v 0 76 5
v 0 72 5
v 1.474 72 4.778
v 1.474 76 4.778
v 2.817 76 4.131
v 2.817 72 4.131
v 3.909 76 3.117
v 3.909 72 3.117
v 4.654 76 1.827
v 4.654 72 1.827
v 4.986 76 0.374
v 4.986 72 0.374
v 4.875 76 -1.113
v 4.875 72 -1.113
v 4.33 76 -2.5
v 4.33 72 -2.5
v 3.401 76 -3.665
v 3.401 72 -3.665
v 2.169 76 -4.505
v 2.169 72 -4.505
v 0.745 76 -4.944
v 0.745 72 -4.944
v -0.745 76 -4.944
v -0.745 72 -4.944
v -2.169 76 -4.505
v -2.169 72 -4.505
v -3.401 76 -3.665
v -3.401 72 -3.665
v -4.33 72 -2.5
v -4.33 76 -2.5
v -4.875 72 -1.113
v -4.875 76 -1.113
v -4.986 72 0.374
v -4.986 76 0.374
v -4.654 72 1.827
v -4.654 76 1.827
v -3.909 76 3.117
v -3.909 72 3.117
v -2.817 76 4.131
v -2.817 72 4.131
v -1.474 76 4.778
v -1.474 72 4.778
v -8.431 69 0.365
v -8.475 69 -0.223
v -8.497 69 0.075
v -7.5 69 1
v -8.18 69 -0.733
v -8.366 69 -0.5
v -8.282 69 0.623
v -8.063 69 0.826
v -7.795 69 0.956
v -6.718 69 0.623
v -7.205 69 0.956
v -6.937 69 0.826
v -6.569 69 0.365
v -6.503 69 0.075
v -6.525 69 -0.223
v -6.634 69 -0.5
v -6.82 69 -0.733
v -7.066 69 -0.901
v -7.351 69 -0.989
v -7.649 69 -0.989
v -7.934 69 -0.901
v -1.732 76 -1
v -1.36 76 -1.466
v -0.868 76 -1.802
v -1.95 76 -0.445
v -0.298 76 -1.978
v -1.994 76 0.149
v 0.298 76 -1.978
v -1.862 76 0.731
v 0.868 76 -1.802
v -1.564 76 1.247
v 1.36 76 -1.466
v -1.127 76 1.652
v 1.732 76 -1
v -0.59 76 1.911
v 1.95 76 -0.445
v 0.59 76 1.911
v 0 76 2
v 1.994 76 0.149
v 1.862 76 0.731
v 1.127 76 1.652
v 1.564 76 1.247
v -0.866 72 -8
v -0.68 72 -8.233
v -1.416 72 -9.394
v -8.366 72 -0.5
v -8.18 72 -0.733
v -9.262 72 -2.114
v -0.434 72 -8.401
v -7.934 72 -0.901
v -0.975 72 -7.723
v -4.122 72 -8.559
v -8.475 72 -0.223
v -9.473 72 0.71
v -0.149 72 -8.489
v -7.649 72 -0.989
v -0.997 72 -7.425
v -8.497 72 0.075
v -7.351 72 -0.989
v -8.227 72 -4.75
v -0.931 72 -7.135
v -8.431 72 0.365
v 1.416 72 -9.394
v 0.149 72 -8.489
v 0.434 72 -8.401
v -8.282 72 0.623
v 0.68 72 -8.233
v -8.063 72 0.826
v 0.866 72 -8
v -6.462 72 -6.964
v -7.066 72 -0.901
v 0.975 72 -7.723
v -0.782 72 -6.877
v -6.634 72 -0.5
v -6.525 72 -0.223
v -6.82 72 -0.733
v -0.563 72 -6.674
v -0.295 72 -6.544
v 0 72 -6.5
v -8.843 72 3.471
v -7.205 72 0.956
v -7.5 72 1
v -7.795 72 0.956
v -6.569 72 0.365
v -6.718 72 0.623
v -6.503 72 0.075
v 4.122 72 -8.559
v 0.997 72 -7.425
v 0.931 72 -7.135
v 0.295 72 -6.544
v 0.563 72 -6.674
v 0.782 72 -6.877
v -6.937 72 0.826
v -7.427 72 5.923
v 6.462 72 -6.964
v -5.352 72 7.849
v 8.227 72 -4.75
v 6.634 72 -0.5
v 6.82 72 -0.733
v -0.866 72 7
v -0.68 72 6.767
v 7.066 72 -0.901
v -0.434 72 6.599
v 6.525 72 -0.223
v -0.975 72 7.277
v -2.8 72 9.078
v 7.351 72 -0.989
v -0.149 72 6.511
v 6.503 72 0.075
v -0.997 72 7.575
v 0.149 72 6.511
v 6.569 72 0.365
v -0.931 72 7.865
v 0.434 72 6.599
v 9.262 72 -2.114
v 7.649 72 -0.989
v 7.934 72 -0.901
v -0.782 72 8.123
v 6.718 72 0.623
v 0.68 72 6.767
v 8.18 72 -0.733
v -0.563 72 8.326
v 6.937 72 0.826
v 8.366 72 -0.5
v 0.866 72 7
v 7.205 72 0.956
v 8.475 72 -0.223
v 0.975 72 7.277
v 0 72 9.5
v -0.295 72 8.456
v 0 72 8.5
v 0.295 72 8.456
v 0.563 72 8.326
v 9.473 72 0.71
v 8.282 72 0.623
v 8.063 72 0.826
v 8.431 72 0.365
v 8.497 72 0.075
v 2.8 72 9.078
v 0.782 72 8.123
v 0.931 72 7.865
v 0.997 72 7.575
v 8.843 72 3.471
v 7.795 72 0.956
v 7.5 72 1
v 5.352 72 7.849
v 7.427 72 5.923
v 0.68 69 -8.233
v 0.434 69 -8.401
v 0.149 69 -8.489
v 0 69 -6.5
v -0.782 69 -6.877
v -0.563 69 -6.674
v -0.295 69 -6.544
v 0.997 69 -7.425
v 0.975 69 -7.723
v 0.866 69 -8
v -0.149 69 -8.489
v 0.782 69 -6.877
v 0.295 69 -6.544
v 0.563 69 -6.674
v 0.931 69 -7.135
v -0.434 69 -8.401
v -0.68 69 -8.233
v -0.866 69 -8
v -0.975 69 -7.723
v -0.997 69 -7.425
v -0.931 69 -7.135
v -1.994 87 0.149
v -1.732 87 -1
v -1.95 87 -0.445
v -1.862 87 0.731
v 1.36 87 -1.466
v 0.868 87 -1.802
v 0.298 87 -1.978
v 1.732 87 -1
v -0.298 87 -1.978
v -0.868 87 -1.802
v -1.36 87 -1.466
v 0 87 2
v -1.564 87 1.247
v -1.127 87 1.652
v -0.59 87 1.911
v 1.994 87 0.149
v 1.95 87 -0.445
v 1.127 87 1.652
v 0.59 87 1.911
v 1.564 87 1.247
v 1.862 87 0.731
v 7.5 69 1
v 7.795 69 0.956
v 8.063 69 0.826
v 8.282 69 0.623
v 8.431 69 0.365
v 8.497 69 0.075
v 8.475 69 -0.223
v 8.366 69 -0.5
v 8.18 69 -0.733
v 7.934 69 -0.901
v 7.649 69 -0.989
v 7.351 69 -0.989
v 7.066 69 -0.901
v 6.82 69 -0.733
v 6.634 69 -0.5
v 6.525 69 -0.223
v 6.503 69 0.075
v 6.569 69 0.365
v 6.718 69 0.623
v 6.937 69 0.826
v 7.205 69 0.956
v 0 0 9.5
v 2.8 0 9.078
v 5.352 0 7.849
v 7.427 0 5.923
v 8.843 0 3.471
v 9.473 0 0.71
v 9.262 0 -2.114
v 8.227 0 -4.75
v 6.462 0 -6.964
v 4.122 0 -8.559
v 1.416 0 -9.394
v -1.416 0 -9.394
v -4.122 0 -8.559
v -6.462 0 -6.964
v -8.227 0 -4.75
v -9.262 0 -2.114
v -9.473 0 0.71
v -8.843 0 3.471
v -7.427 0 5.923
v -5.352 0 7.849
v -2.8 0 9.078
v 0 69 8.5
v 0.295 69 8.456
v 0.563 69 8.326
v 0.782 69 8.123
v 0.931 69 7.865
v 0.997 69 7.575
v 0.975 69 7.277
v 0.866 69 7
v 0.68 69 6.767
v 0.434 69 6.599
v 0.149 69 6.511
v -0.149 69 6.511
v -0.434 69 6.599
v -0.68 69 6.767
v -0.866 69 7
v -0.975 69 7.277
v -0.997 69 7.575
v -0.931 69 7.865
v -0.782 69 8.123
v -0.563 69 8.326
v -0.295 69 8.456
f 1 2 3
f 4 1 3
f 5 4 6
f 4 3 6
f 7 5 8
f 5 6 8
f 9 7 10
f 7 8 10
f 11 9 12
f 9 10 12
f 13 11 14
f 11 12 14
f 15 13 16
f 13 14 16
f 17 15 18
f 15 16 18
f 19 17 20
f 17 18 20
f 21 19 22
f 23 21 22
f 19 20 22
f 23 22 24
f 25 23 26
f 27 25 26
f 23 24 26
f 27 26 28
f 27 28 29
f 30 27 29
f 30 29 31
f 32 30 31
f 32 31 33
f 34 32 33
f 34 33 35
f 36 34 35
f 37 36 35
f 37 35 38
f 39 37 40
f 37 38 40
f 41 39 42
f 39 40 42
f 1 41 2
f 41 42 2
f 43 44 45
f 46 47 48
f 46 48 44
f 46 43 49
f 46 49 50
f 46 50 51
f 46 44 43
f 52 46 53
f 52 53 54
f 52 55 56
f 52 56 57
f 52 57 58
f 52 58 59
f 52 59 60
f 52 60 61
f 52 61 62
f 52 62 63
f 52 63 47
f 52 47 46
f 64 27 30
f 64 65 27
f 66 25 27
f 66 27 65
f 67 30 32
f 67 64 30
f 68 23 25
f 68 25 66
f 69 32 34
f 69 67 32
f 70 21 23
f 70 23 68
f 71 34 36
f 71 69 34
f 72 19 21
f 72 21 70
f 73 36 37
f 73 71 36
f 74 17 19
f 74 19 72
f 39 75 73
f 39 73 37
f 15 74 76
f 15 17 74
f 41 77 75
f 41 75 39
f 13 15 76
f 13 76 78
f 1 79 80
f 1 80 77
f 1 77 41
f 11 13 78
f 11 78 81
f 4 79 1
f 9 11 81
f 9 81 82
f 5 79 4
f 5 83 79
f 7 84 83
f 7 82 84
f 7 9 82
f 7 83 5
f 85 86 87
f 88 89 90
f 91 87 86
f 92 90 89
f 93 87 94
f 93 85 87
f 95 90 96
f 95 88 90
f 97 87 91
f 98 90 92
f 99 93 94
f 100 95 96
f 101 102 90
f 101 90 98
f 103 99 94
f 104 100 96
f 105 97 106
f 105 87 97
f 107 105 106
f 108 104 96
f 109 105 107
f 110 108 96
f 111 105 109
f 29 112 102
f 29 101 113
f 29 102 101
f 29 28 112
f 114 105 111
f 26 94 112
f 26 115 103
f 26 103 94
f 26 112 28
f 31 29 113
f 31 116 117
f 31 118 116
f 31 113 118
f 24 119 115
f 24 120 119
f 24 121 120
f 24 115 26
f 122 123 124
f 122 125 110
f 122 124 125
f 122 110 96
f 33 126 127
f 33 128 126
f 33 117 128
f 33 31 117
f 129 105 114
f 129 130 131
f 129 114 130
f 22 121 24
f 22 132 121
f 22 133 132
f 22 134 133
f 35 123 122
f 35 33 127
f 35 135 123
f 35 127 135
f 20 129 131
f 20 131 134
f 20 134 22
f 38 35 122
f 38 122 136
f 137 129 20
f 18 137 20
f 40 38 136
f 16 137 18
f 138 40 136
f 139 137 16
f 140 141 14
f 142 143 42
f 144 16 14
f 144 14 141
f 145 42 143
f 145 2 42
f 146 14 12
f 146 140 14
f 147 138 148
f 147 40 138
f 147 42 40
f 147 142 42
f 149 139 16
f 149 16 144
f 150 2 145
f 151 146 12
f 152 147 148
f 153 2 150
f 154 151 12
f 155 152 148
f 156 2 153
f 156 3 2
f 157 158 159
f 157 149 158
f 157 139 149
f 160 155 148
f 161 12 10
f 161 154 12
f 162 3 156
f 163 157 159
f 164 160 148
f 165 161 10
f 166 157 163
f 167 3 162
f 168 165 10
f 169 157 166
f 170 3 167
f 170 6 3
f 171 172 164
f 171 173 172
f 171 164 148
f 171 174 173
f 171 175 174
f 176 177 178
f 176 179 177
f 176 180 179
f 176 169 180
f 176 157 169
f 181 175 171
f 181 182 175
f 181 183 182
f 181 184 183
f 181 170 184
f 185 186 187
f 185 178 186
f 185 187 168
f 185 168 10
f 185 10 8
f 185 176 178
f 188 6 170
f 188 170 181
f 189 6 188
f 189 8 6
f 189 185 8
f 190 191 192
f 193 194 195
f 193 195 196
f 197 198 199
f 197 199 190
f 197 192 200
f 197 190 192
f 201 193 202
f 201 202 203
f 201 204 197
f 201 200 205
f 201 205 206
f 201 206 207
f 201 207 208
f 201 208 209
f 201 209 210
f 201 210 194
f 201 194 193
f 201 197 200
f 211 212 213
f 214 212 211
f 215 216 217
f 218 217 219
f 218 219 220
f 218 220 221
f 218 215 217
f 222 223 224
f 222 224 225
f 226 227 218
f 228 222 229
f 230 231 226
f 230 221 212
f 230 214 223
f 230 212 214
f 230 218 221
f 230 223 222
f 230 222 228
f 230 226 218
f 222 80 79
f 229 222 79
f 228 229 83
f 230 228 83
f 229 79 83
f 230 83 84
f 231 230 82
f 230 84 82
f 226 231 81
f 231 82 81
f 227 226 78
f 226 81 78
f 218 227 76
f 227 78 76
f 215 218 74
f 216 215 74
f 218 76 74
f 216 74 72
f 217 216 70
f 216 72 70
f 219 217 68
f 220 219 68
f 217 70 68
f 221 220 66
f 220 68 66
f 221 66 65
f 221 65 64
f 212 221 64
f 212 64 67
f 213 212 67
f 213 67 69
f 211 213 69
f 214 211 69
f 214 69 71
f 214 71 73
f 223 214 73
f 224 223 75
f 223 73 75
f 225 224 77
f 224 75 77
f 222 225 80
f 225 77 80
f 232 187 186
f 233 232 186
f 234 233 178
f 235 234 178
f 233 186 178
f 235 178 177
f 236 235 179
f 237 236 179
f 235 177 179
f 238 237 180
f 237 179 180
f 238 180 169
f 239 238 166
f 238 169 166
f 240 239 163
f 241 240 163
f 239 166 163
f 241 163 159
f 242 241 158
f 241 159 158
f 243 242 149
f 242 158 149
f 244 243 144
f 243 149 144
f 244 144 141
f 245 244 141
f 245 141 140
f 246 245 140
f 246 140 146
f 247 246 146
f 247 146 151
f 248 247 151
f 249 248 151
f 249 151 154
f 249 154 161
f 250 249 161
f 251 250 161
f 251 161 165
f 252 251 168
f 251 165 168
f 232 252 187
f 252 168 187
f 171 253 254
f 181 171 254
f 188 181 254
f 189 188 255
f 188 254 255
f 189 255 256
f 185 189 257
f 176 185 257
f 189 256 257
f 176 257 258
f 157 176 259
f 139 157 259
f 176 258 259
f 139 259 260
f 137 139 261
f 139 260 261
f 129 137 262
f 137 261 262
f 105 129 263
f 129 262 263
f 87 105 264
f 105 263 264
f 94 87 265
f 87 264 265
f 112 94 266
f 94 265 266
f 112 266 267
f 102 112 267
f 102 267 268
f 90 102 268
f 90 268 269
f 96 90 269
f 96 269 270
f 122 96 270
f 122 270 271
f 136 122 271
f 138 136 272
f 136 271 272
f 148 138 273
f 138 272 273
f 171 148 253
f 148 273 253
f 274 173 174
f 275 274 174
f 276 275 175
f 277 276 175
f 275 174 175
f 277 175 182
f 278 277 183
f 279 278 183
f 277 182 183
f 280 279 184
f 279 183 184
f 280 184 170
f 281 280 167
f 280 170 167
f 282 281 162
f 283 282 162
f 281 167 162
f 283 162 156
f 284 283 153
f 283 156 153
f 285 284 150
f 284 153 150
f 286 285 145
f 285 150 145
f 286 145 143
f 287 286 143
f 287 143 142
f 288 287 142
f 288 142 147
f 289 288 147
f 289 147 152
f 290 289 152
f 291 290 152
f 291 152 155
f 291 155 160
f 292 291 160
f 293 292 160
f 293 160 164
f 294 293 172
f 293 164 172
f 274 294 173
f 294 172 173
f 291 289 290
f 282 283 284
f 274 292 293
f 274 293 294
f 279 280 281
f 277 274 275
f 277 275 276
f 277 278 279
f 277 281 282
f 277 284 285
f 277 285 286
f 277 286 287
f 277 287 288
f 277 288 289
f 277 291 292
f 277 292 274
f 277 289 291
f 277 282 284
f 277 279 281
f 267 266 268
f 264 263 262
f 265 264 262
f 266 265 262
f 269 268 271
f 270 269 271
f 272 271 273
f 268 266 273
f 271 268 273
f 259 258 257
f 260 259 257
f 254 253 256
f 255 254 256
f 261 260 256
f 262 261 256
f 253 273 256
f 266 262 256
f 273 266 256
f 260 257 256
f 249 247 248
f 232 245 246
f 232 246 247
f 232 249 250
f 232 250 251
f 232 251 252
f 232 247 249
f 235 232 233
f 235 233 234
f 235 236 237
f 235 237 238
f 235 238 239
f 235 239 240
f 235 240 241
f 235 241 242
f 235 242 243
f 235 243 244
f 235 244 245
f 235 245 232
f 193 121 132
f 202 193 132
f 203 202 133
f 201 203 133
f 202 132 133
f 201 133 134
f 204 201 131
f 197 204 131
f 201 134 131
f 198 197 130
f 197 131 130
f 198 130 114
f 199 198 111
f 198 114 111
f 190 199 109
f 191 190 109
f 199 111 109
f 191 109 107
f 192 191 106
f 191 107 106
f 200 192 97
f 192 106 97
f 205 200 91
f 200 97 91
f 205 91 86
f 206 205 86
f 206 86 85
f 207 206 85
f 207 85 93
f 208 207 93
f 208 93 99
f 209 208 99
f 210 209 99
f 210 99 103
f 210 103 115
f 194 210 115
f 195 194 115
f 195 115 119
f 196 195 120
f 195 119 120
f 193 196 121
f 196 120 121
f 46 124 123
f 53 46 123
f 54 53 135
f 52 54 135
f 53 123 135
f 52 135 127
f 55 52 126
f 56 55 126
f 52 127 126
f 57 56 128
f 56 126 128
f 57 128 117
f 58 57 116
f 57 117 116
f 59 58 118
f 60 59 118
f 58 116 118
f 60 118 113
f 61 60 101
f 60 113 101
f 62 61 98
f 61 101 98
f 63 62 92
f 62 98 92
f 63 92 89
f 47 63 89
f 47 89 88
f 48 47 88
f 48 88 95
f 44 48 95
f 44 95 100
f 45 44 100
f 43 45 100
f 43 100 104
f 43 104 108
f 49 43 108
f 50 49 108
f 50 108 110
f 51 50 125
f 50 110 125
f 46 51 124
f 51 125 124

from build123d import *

# Parameters (mm, degrees)
SKETCH_1_R          = 9.5
EXTRUDE_1_DEPTH     = 72
SKETCH_2_R          = 5
EXTRUDE_2_DEPTH     = 4
SKETCH_3_R          = 2
EXTRUDE_3_DEPTH     = 11
SKETCH_4_R          = 1
CUT_EXTRUDE_1_DEPTH = 3


with BuildPart() as part:
    # 草图1 → 凸台-拉伸1 (new body)
    with BuildSketch(Plane(origin=(0, 0, 0), x_dir=(1, 0, 0), z_dir=(0, 1, 0))):
        with Locations(Location((0, 0, 0), (0, 0, 270))):
            Circle(SKETCH_1_R)
    extrude(amount=EXTRUDE_1_DEPTH)

    # 草图2 → 凸台-拉伸2 (add)
    with BuildSketch(Plane(origin=(0, 72, 0), x_dir=(1, 0, 0), z_dir=(0, 1, 0))):
        with Locations(Location((0, 0, 0), (0, 0, 270))):
            Circle(SKETCH_2_R)
    extrude(amount=EXTRUDE_2_DEPTH)

    # 草图3 → 凸台-拉伸3 (add)
    with BuildSketch(Plane(origin=(0, 76, 0), x_dir=(1, 0, 0), z_dir=(0, 1, 0))):
        with Locations(Location((0, 0, 0), (0, 0, 270))):
            Circle(SKETCH_3_R)
    extrude(amount=EXTRUDE_3_DEPTH)

    # 草图4 → 切除-拉伸1 (cut)
    with BuildSketch(Plane(origin=(0, 72, 0), x_dir=(1, 0, 0), z_dir=(0, 1, 0))):
        with Locations(Location((7.5, 0, 0), (0, 0, 270))):
            Circle(SKETCH_4_R)
        with Locations(Location((0, 7.5, 0), (0, 0, 270))):
            Circle(SKETCH_4_R)
        with Locations(Location((0, -7.5, 0), (0, 0, 270))):
            Circle(SKETCH_4_R)
        with Locations(Location((-7.5, 0, 0), (0, 0, 270))):
            Circle(SKETCH_4_R)
    extrude(amount=-CUT_EXTRUDE_1_DEPTH, mode=Mode.SUBTRACT)


solid = part.part
